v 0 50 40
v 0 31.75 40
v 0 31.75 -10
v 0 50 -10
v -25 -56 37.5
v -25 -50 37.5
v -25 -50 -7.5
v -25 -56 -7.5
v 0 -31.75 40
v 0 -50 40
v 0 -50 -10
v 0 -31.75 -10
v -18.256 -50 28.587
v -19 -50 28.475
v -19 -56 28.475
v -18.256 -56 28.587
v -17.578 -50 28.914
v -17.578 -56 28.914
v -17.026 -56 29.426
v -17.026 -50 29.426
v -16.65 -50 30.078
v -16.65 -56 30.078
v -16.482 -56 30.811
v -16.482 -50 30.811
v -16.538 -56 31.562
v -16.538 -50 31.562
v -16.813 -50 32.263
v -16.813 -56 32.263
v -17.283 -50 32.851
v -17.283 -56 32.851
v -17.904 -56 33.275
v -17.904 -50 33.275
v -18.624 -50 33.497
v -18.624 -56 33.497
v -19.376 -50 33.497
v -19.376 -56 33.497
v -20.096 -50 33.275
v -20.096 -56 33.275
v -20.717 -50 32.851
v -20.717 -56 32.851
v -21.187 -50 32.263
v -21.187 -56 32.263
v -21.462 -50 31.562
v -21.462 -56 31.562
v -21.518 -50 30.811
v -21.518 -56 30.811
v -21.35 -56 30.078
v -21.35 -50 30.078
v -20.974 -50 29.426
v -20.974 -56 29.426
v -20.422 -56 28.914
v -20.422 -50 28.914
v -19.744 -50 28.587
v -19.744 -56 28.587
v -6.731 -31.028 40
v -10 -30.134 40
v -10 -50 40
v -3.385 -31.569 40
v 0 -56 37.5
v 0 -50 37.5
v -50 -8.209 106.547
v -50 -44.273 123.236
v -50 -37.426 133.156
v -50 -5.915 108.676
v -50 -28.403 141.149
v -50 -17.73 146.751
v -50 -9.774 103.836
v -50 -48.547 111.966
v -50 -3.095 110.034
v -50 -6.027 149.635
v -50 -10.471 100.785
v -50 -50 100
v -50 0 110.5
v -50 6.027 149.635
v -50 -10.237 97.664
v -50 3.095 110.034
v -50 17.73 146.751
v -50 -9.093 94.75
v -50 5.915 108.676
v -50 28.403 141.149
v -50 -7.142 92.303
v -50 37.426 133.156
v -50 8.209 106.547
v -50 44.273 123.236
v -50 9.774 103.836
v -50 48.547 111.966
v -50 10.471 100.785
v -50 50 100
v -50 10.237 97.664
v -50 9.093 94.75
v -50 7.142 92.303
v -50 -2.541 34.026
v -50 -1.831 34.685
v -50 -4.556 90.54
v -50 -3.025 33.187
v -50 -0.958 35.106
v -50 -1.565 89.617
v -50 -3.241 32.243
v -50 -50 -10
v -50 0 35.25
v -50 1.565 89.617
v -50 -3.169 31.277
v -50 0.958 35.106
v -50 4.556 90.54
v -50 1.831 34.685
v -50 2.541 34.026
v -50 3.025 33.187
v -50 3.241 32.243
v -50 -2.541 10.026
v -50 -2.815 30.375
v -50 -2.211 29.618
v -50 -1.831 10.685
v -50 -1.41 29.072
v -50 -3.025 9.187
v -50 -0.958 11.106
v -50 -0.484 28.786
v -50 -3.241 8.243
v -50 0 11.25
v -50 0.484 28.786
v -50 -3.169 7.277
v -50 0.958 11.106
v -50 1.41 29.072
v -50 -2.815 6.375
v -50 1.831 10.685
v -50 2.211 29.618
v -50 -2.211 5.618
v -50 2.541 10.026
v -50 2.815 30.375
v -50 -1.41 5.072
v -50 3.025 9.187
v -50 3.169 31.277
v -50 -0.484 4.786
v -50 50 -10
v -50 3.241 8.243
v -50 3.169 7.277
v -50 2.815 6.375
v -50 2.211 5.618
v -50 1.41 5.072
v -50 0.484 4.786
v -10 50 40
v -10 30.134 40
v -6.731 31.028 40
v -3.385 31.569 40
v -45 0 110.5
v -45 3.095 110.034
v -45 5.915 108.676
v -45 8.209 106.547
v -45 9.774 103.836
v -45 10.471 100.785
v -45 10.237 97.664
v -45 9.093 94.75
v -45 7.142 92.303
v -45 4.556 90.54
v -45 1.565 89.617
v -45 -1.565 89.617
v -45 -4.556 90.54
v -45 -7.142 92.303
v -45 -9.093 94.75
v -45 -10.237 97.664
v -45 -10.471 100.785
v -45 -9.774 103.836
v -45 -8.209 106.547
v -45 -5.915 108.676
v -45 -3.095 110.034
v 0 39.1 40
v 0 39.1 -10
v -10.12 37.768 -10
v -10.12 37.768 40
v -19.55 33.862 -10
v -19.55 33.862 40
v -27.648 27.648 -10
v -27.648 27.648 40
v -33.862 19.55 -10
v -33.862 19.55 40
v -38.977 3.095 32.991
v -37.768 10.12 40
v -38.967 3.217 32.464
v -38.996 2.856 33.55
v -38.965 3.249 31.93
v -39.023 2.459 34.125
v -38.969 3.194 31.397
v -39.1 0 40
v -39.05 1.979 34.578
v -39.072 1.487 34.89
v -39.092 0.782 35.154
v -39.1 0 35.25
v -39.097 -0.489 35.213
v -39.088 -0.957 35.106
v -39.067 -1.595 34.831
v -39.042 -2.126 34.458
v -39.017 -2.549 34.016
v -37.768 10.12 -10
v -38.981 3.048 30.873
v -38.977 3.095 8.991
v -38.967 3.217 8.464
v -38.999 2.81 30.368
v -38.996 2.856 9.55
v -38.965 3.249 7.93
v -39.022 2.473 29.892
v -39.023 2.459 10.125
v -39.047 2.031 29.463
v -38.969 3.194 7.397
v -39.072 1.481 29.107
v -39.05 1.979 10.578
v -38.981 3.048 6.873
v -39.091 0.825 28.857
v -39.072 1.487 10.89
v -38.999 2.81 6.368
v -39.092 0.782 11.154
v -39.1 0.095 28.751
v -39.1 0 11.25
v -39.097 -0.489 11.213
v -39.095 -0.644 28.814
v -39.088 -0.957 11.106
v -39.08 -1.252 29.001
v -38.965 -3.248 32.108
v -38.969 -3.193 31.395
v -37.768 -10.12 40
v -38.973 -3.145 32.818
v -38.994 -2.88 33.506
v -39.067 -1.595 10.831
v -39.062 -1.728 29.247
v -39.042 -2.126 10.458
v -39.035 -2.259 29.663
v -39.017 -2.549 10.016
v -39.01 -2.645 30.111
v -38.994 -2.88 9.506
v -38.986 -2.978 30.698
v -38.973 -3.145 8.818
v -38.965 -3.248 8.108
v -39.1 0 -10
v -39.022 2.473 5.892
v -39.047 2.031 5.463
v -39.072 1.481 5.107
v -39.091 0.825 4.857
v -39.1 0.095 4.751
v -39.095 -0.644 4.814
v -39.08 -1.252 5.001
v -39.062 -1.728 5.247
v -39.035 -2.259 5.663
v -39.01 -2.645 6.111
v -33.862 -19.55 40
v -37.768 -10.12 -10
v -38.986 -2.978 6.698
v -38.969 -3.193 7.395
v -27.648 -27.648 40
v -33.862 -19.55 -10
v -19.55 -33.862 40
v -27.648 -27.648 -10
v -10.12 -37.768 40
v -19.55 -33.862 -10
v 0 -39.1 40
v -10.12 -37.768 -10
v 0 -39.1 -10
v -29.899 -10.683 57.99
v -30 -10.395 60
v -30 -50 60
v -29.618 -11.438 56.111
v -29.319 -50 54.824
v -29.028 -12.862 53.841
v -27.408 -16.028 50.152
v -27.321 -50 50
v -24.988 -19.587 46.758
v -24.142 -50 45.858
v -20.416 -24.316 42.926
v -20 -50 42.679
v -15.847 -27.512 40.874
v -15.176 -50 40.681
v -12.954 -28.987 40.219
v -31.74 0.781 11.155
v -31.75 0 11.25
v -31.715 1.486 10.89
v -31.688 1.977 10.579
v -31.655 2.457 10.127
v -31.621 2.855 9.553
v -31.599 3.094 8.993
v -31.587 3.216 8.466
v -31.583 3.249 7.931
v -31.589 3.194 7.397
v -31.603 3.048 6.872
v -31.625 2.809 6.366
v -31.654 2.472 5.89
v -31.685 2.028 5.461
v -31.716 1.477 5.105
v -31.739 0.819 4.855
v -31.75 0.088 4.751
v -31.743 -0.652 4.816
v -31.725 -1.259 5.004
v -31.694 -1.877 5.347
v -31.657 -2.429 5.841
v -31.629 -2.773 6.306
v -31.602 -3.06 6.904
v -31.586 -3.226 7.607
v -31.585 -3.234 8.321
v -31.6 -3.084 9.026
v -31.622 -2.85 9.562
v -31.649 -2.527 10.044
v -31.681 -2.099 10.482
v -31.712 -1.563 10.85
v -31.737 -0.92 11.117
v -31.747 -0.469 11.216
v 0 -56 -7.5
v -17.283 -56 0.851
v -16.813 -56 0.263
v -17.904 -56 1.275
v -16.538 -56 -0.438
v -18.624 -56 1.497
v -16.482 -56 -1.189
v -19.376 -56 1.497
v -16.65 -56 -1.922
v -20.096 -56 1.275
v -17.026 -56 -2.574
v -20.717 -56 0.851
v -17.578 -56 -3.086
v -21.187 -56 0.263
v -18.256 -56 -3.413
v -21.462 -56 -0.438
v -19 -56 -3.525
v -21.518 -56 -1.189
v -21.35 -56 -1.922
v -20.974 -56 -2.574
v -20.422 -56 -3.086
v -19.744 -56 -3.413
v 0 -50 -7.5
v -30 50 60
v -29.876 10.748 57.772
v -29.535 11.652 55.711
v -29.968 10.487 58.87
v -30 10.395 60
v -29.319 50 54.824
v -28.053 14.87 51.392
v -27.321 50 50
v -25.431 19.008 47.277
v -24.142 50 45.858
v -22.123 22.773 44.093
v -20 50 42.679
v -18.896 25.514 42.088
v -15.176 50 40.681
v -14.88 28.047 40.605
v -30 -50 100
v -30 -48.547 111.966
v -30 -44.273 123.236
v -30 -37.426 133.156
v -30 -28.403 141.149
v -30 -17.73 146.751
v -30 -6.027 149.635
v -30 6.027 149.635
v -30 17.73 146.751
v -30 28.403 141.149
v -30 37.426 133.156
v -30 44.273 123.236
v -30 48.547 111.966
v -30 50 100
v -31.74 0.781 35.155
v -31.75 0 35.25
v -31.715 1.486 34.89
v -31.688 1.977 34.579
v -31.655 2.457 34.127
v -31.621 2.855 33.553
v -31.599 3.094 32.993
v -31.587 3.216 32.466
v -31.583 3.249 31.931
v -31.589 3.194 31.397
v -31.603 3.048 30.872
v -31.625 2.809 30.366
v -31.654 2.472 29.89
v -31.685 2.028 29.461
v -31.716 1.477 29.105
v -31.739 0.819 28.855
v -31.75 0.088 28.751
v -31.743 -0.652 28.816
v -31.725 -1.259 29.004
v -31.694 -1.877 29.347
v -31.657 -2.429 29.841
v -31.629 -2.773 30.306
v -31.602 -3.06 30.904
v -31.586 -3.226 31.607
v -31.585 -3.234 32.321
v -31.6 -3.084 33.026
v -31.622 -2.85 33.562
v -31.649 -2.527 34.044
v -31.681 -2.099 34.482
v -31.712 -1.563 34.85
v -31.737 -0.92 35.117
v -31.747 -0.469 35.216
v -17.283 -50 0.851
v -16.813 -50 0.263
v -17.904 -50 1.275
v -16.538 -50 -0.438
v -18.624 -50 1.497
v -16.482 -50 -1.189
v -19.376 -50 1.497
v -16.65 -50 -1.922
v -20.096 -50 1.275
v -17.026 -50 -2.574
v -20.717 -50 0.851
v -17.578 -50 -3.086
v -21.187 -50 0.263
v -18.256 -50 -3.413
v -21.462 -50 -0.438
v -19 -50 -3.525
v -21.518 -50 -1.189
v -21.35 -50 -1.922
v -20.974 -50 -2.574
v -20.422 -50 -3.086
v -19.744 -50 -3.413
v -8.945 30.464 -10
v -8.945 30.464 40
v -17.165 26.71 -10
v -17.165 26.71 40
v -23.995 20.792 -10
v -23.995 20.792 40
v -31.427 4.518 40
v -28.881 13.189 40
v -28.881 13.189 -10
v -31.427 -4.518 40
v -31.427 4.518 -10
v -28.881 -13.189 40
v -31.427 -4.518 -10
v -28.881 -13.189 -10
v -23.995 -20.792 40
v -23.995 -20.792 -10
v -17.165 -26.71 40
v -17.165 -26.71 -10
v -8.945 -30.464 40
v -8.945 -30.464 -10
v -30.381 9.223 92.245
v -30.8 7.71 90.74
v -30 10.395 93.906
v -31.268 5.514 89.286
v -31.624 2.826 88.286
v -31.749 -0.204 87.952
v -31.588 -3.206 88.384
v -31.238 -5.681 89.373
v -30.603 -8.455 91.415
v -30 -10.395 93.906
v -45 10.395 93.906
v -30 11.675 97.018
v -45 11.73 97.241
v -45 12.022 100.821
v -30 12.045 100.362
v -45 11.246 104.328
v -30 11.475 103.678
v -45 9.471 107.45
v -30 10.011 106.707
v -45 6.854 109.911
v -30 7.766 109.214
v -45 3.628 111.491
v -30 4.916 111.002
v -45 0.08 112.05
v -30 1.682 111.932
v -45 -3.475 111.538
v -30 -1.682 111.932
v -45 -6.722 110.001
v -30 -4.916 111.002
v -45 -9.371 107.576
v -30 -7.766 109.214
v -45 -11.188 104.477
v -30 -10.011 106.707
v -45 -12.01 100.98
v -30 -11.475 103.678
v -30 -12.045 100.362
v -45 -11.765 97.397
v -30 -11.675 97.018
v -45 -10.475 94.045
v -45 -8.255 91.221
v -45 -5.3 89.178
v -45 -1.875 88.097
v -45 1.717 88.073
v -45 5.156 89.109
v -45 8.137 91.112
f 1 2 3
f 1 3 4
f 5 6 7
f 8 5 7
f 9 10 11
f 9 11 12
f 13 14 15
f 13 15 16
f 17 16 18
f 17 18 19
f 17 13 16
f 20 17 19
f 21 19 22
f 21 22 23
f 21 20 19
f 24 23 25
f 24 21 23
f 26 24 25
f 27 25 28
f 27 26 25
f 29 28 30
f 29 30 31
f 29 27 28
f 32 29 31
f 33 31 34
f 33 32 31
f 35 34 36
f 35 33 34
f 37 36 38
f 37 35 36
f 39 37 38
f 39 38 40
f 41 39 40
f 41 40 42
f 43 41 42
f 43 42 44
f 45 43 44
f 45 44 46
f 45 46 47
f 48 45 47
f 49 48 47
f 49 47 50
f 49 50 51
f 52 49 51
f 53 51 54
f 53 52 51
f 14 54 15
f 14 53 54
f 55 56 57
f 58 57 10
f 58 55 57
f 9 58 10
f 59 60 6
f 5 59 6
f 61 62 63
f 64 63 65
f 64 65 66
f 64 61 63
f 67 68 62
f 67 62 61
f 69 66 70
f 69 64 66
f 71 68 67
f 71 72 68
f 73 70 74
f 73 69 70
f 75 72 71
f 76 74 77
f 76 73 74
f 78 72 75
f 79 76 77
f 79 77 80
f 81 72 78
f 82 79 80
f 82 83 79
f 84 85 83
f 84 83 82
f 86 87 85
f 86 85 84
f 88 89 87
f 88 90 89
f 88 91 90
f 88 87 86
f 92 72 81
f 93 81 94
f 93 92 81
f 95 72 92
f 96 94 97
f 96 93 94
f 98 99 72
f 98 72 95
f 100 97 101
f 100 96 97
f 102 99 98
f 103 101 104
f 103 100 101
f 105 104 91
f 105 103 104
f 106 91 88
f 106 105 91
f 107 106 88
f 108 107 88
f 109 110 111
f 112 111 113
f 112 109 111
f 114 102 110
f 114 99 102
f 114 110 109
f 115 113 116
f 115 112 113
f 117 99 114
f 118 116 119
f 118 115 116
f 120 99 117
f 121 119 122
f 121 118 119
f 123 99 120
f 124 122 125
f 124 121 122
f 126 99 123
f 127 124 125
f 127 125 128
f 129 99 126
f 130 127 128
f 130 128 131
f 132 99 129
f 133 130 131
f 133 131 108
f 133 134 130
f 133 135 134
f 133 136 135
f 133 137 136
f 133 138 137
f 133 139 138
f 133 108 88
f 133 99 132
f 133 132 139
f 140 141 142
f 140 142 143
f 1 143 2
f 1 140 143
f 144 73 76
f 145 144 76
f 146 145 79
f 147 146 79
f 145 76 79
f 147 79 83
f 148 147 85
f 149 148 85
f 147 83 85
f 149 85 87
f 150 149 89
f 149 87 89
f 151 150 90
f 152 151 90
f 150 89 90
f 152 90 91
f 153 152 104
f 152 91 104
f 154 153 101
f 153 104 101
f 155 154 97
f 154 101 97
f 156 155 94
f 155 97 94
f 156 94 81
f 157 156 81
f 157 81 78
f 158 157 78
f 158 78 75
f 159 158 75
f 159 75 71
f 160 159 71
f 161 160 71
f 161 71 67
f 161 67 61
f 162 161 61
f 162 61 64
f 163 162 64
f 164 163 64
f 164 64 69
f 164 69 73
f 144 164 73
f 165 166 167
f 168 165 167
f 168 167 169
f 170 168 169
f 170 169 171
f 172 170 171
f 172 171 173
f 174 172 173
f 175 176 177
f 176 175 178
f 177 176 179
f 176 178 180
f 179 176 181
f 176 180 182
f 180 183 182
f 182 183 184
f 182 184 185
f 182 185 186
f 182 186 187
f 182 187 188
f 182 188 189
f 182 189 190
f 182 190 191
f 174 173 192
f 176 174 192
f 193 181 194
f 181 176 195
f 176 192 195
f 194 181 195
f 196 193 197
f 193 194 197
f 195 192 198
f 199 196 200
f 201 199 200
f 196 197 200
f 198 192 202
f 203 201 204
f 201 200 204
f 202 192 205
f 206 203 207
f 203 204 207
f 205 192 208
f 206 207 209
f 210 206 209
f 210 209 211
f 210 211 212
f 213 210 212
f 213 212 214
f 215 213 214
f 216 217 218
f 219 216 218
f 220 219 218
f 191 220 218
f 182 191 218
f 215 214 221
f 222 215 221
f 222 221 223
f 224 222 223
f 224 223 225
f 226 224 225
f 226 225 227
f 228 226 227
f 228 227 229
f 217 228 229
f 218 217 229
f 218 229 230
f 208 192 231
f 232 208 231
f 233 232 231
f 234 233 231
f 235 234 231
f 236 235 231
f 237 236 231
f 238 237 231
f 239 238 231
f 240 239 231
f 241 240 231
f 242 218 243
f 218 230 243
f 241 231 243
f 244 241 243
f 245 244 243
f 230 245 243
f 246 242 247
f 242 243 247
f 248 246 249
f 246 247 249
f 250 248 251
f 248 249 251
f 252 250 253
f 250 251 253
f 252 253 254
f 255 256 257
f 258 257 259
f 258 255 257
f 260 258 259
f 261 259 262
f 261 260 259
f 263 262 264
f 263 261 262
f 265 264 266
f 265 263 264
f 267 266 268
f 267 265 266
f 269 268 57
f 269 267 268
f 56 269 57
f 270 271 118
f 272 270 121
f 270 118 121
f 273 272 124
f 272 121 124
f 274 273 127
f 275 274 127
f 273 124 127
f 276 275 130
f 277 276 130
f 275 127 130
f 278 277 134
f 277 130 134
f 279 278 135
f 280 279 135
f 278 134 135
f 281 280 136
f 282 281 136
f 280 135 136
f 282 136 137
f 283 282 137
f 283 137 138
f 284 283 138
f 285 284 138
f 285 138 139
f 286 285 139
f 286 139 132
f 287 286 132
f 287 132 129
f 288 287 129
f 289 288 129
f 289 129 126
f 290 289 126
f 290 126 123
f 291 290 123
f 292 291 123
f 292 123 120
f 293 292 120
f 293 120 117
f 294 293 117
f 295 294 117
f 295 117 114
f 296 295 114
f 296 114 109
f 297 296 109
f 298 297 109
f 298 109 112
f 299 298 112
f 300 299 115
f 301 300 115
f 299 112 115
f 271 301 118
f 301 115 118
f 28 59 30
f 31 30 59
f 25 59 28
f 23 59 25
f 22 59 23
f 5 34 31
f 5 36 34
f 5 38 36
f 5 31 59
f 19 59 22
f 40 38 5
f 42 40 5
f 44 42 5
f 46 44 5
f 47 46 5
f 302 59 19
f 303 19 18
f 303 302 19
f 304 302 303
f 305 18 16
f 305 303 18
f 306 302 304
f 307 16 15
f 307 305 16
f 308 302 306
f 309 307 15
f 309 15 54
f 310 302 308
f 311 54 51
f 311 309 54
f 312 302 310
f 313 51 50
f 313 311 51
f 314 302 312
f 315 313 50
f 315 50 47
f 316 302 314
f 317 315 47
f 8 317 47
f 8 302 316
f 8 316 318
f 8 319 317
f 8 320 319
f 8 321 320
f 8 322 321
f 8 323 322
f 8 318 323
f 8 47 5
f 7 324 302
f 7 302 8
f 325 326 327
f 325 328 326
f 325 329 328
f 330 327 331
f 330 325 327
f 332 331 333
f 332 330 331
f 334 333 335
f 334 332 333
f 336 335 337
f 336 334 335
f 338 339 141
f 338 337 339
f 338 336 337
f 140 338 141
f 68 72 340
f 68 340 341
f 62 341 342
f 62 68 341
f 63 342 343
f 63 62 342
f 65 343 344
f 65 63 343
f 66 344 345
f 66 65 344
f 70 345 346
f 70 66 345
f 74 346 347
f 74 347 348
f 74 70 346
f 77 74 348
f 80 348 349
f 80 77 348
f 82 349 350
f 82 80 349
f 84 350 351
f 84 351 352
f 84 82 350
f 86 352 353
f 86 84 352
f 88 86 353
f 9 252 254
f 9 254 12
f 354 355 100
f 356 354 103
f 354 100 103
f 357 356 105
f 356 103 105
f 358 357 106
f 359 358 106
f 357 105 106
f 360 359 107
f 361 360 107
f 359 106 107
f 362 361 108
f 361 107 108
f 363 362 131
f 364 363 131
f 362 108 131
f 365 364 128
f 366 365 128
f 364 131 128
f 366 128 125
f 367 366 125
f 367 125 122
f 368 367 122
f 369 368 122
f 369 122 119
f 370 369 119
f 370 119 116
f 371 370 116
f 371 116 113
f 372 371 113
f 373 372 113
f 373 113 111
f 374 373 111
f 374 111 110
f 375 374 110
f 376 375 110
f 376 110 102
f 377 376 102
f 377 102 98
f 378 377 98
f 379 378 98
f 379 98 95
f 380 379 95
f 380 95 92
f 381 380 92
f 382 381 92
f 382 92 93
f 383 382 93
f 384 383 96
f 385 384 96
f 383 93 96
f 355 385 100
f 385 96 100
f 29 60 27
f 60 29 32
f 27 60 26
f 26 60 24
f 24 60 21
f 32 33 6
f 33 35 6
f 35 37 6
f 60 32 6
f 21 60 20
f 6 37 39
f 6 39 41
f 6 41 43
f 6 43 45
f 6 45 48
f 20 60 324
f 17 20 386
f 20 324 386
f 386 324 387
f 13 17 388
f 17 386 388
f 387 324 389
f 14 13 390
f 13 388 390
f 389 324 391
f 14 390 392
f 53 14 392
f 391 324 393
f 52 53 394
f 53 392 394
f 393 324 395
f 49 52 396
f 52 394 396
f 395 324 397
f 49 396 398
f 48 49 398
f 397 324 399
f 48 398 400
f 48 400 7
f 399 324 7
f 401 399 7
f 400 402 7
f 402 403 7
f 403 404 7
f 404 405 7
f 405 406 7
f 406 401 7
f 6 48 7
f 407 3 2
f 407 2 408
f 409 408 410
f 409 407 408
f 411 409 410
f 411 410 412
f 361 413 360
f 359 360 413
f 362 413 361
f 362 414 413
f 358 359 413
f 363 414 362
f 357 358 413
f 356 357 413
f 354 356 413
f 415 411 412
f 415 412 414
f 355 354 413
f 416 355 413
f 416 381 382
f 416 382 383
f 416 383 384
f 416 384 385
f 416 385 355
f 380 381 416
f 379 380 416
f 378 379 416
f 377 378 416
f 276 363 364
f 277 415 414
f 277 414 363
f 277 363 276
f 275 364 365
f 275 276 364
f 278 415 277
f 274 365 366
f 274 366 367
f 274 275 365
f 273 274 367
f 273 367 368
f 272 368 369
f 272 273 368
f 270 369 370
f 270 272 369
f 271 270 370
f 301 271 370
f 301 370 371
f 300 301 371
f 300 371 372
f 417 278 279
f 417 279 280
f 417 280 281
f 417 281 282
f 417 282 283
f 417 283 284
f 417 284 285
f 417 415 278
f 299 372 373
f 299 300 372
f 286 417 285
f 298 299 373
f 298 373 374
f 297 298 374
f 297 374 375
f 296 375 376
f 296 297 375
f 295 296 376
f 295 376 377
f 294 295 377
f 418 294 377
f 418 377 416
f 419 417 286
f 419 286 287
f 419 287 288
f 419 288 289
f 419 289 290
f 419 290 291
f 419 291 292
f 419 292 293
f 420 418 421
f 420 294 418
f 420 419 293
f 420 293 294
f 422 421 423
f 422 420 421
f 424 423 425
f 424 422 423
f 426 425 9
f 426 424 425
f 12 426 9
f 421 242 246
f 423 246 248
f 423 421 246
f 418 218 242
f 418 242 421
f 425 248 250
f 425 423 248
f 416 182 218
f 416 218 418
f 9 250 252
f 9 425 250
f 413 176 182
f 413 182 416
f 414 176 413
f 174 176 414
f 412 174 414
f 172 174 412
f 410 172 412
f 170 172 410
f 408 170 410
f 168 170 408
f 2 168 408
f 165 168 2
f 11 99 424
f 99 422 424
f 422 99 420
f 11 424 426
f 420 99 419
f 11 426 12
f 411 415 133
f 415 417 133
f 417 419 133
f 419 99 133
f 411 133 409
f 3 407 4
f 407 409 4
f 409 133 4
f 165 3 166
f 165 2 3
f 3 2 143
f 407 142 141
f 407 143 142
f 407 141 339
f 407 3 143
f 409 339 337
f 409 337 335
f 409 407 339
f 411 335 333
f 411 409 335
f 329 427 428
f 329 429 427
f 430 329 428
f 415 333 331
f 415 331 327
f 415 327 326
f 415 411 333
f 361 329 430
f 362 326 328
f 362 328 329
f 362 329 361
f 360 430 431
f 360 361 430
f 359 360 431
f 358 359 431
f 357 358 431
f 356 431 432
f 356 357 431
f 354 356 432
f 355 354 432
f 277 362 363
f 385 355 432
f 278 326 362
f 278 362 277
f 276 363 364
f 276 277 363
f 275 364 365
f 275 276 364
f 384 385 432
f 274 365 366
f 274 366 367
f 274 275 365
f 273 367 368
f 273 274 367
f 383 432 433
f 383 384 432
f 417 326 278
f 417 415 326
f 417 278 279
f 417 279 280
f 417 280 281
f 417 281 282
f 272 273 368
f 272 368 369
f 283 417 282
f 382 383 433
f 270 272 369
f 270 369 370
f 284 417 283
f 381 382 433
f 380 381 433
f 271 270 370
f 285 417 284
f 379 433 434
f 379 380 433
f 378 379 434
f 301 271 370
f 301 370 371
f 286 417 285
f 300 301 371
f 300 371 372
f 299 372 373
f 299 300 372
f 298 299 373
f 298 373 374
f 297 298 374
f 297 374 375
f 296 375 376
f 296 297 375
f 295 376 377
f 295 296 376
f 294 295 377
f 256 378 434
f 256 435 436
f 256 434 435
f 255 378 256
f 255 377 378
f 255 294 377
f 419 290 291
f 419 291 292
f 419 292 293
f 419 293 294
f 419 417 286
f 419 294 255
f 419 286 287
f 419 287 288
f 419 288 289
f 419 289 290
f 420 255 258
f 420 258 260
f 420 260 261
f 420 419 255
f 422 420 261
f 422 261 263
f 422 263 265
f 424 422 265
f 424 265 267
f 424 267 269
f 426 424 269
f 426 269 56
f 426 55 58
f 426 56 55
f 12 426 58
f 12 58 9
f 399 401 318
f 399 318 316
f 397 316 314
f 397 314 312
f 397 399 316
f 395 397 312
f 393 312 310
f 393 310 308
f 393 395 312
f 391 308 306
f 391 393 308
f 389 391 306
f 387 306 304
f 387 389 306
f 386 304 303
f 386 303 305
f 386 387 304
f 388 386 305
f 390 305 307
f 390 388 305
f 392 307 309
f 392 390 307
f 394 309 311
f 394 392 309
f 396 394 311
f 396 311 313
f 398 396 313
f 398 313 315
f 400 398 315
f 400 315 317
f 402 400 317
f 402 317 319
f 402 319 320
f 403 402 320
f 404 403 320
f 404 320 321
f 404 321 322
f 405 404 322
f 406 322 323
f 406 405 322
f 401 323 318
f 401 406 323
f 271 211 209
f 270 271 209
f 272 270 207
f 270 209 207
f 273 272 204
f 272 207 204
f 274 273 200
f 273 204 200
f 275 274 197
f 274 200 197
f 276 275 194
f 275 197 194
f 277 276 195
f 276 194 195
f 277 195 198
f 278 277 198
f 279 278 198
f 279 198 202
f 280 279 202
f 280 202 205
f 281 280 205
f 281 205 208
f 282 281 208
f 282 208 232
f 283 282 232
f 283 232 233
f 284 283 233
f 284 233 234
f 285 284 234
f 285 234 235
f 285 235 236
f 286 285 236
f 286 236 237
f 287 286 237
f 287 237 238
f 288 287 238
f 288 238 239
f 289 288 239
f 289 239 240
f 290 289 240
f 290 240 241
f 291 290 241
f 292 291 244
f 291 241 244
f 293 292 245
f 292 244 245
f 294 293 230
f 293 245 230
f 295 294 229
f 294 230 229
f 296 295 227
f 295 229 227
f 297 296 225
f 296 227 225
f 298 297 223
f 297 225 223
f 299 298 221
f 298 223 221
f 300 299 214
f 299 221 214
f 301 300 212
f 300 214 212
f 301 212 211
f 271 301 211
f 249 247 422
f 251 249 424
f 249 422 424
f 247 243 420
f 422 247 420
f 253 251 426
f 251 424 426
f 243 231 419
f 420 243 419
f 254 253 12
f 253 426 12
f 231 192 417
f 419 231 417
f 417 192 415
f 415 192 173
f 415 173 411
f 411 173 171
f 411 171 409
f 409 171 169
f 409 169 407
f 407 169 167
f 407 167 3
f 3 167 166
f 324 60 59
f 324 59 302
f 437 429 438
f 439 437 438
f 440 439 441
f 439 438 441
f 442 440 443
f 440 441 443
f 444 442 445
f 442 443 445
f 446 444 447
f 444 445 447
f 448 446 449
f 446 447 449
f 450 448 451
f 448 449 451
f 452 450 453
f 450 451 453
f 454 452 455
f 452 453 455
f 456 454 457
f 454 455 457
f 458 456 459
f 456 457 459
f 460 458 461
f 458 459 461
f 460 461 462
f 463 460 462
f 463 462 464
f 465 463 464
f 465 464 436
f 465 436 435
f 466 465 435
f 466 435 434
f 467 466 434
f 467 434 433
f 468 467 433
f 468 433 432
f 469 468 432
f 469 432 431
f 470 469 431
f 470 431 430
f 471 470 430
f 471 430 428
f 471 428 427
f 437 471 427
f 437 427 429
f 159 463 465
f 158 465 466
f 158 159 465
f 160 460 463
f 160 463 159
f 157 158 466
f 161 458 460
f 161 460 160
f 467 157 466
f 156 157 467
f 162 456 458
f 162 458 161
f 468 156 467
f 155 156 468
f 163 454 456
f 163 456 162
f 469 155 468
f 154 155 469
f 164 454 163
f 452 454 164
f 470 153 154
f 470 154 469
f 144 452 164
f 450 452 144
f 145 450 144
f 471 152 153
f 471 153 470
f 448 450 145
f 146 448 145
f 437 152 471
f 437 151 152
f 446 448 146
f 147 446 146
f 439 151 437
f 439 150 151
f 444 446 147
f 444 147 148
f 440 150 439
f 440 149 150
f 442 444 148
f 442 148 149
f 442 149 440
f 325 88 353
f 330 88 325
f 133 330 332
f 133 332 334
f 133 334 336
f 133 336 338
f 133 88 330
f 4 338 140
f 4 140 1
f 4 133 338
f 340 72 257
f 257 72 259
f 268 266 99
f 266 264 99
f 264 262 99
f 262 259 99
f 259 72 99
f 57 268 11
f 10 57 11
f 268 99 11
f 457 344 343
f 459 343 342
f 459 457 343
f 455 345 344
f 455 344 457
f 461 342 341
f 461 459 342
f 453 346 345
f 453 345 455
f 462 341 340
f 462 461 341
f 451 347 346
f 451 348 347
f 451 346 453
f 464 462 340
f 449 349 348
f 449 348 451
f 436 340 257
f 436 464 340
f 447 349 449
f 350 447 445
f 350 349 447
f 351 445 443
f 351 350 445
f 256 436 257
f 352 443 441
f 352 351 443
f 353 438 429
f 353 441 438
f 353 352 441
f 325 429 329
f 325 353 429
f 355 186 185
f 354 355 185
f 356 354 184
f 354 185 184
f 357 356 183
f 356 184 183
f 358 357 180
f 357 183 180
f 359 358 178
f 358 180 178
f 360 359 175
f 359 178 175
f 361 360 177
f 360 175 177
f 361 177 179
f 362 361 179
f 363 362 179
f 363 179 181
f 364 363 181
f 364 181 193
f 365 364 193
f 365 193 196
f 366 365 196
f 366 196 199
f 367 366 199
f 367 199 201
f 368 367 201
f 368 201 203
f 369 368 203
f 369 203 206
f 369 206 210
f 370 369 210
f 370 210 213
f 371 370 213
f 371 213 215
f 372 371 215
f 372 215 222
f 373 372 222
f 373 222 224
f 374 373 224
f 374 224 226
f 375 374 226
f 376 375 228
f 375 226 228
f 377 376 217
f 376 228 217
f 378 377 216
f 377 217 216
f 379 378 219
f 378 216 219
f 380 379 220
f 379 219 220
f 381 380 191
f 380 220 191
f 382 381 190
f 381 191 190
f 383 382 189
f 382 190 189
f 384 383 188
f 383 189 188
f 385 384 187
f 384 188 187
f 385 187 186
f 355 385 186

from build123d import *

# Parameters (mm, degrees)
CENTRE_HOLE_FOR_L2_DEPTH      = 40
CENTRE_HOLE_FOR_L2_DEPTH_BACK = 10
SKETCH1_R                     = 39.1
SKETCH1_R_2                   = 31.75
MAIN_STRUCTURE_DEPTH          = 60
MAIN_STRUCTURE_DEPTH_BACK     = 50
SKETCH2_W                     = 100
SKETCH2_H                     = 100
SKETCH2_R                     = 31.75
BEARING_CURVE_DEPTH           = 20
SHAFT_HOLE_REACH              = 189.083
SKETCH6_R                     = 10.5
WRIST_CUTOUT_DEPTH            = 188.082869365
SKETCH9_R                     = 12.05
BEARING_DEPTH                 = 15
SURFACECUT1_DEPTH             = 50
SKETCH13_W                    = 25
SKETCH13_H                    = 45
SKETCH13_R                    = 2.525
BOSS_EXTRUDE1_DEPTH           = 6
SKETCH14_R                    = 3.25
CUT_EXTRUDE2_DEPTH            = 168.7378908


# Read off the part's stored shape, not the designer's step: SurfaceCut1
with BuildPart() as part:
    # Sketch1 → Centre Hole for L2 (new, two sides: drawn at the far end of the back side and taken through both)
    with BuildSketch(Plane.XY.offset(-CENTRE_HOLE_FOR_L2_DEPTH_BACK)):
        Circle(SKETCH1_R)
        Circle(SKETCH1_R_2, mode=Mode.SUBTRACT)
    extrude(amount=CENTRE_HOLE_FOR_L2_DEPTH + CENTRE_HOLE_FOR_L2_DEPTH_BACK)


with BuildPart() as body_2:
    # Sketch2 → Main Structure (new, two sides: drawn at the far end of the back side and taken through both)
    with BuildSketch(Plane.XY.offset(40).offset(-MAIN_STRUCTURE_DEPTH_BACK)):
        Rectangle(SKETCH2_W, SKETCH2_H)
        Circle(SKETCH2_R, mode=Mode.SUBTRACT)
    extrude(amount=MAIN_STRUCTURE_DEPTH + MAIN_STRUCTURE_DEPTH_BACK)

    # Sketch3 → Bearing Curve (add)
    with BuildSketch(Plane.ZY.offset(50)):
        with BuildLine():
            Line((100, 50), (100, -50))
            ThreePointArc((100, -50), (150, 0), (100, 50))
        make_face()
    bearing_curve = extrude(amount=-BEARING_CURVE_DEPTH)

    # Upright Mirror: Bearing Curve across plane
    add(bearing_curve.mirror(Plane(origin=(0, 0, 0), x_dir=(0, 0, 1), z_dir=(1, 0, 0))))

    # Shaft Hole: up to this face of the body (flat: up to its plane)
    shaft_hole_end = Plane(body_2.part.faces().sort_by_distance((-30, 0, 121.220659079))[0])
    # Sketch6 → Shaft Hole (cut, up to the picked face)
    with BuildSketch(Plane.ZY.offset(50), mode=Mode.PRIVATE) as shaft_hole_sk1:
        with Locations((100, 0)):
            Circle(SKETCH6_R)
    shaft_hole_tool1 = split(extrude(shaft_hole_sk1.sketch, amount=-SHAFT_HOLE_REACH, mode=Mode.PRIVATE), bisect_by=shaft_hole_end, keep=Keep.BOTH, mode=Mode.PRIVATE)
    add(shaft_hole_tool1.solids().sort_by(Axis((-50, 0, 100), (1, 0, 0)))[0], mode=Mode.SUBTRACT)

    # Sketch4 → Wrist Cutout (cut, through all)
    with BuildSketch(Plane(origin=(0, 50, 0), x_dir=(1, 0, 0), z_dir=(0, 1, 0))):
        with BuildLine():
            Line((-30, -100), (-30, -60))
            ThreePointArc((-30, -60), (-24.142135624, -45.857864376), (-10, -40))
            Line((-10, -40), (10, -40))
            ThreePointArc((10, -40), (24.142135624, -45.857864376), (30, -60))
            Line((30, -60), (30, -100))
            Line((30, -100), (-30, -100))
        make_face()
    extrude(amount=-WRIST_CUTOUT_DEPTH, mode=Mode.SUBTRACT)

    # Sketch9 → Bearing (cut)
    with BuildSketch(Plane(origin=(-30, 0, 0), x_dir=(0, 0, -1), z_dir=(1, 0, 0))):
        with Locations(Location((-100, 0, 0), (0, 0, 59.619002111))):
            Circle(SKETCH9_R)
    extrude(amount=-BEARING_DEPTH, mode=Mode.SUBTRACT)


with BuildPart() as surfacecut1_tool:
    # SurfaceCut1 outline → SurfaceCut1 (new body)
    with BuildSketch(Plane.YZ):
        with BuildLine():
            ThreePointArc((50, 100), (0, 150), (-50, 100))
            Line((-50, 100), (-50, -10))
            Line((-50, -10), (50, -10))
            Line((50, -10), (50, 100))
        make_face()
    extrude(amount=SURFACECUT1_DEPTH)


with BuildPart() as part_1:
    add(part.part)

    # SurfaceCut1: cut by surfacecut1_tool
    add(surfacecut1_tool.part, mode=Mode.SUBTRACT)


with BuildPart() as body_2_1:
    add(body_2.part)

    # SurfaceCut1: cut by surfacecut1_tool
    add(surfacecut1_tool.part, mode=Mode.SUBTRACT)


with BuildPart() as body_3:
    # Sketch13 → Boss-Extrude1 (new body)
    with BuildSketch(Plane(origin=(0, -50, 0), x_dir=(-1, 0, 0), z_dir=(0, -1, 0))):
        with Locations((12.5, -15)):
            Rectangle(SKETCH13_W, SKETCH13_H)
        with Locations(Location((19, -31, 0), (0, 0, 90))):
            Circle(SKETCH13_R, mode=Mode.SUBTRACT)
        with Locations(Location((19, 1, 0), (0, 0, 90))):
            Circle(SKETCH13_R, mode=Mode.SUBTRACT)
    extrude(amount=BOSS_EXTRUDE1_DEPTH)


with BuildPart() as cut_extrude2_tool:
    # Sketch14 → Cut-Extrude2 (new, through all)
    with BuildSketch(Plane.ZY.offset(50)):
        with Locations((8, 0)):
            Circle(SKETCH14_R)
        with Locations((32, 0)):
            Circle(SKETCH14_R)
    extrude(amount=-CUT_EXTRUDE2_DEPTH)


with BuildPart() as part_2:
    add(part_1.part)

    # Cut-Extrude2: cut by cut_extrude2_tool
    add(cut_extrude2_tool.part, mode=Mode.SUBTRACT)


with BuildPart() as body_2_2:
    add(body_2_1.part)

    # Cut-Extrude2: cut by cut_extrude2_tool
    add(cut_extrude2_tool.part, mode=Mode.SUBTRACT)


solid = Compound([body_3.part, part_2.part, body_2_2.part])
